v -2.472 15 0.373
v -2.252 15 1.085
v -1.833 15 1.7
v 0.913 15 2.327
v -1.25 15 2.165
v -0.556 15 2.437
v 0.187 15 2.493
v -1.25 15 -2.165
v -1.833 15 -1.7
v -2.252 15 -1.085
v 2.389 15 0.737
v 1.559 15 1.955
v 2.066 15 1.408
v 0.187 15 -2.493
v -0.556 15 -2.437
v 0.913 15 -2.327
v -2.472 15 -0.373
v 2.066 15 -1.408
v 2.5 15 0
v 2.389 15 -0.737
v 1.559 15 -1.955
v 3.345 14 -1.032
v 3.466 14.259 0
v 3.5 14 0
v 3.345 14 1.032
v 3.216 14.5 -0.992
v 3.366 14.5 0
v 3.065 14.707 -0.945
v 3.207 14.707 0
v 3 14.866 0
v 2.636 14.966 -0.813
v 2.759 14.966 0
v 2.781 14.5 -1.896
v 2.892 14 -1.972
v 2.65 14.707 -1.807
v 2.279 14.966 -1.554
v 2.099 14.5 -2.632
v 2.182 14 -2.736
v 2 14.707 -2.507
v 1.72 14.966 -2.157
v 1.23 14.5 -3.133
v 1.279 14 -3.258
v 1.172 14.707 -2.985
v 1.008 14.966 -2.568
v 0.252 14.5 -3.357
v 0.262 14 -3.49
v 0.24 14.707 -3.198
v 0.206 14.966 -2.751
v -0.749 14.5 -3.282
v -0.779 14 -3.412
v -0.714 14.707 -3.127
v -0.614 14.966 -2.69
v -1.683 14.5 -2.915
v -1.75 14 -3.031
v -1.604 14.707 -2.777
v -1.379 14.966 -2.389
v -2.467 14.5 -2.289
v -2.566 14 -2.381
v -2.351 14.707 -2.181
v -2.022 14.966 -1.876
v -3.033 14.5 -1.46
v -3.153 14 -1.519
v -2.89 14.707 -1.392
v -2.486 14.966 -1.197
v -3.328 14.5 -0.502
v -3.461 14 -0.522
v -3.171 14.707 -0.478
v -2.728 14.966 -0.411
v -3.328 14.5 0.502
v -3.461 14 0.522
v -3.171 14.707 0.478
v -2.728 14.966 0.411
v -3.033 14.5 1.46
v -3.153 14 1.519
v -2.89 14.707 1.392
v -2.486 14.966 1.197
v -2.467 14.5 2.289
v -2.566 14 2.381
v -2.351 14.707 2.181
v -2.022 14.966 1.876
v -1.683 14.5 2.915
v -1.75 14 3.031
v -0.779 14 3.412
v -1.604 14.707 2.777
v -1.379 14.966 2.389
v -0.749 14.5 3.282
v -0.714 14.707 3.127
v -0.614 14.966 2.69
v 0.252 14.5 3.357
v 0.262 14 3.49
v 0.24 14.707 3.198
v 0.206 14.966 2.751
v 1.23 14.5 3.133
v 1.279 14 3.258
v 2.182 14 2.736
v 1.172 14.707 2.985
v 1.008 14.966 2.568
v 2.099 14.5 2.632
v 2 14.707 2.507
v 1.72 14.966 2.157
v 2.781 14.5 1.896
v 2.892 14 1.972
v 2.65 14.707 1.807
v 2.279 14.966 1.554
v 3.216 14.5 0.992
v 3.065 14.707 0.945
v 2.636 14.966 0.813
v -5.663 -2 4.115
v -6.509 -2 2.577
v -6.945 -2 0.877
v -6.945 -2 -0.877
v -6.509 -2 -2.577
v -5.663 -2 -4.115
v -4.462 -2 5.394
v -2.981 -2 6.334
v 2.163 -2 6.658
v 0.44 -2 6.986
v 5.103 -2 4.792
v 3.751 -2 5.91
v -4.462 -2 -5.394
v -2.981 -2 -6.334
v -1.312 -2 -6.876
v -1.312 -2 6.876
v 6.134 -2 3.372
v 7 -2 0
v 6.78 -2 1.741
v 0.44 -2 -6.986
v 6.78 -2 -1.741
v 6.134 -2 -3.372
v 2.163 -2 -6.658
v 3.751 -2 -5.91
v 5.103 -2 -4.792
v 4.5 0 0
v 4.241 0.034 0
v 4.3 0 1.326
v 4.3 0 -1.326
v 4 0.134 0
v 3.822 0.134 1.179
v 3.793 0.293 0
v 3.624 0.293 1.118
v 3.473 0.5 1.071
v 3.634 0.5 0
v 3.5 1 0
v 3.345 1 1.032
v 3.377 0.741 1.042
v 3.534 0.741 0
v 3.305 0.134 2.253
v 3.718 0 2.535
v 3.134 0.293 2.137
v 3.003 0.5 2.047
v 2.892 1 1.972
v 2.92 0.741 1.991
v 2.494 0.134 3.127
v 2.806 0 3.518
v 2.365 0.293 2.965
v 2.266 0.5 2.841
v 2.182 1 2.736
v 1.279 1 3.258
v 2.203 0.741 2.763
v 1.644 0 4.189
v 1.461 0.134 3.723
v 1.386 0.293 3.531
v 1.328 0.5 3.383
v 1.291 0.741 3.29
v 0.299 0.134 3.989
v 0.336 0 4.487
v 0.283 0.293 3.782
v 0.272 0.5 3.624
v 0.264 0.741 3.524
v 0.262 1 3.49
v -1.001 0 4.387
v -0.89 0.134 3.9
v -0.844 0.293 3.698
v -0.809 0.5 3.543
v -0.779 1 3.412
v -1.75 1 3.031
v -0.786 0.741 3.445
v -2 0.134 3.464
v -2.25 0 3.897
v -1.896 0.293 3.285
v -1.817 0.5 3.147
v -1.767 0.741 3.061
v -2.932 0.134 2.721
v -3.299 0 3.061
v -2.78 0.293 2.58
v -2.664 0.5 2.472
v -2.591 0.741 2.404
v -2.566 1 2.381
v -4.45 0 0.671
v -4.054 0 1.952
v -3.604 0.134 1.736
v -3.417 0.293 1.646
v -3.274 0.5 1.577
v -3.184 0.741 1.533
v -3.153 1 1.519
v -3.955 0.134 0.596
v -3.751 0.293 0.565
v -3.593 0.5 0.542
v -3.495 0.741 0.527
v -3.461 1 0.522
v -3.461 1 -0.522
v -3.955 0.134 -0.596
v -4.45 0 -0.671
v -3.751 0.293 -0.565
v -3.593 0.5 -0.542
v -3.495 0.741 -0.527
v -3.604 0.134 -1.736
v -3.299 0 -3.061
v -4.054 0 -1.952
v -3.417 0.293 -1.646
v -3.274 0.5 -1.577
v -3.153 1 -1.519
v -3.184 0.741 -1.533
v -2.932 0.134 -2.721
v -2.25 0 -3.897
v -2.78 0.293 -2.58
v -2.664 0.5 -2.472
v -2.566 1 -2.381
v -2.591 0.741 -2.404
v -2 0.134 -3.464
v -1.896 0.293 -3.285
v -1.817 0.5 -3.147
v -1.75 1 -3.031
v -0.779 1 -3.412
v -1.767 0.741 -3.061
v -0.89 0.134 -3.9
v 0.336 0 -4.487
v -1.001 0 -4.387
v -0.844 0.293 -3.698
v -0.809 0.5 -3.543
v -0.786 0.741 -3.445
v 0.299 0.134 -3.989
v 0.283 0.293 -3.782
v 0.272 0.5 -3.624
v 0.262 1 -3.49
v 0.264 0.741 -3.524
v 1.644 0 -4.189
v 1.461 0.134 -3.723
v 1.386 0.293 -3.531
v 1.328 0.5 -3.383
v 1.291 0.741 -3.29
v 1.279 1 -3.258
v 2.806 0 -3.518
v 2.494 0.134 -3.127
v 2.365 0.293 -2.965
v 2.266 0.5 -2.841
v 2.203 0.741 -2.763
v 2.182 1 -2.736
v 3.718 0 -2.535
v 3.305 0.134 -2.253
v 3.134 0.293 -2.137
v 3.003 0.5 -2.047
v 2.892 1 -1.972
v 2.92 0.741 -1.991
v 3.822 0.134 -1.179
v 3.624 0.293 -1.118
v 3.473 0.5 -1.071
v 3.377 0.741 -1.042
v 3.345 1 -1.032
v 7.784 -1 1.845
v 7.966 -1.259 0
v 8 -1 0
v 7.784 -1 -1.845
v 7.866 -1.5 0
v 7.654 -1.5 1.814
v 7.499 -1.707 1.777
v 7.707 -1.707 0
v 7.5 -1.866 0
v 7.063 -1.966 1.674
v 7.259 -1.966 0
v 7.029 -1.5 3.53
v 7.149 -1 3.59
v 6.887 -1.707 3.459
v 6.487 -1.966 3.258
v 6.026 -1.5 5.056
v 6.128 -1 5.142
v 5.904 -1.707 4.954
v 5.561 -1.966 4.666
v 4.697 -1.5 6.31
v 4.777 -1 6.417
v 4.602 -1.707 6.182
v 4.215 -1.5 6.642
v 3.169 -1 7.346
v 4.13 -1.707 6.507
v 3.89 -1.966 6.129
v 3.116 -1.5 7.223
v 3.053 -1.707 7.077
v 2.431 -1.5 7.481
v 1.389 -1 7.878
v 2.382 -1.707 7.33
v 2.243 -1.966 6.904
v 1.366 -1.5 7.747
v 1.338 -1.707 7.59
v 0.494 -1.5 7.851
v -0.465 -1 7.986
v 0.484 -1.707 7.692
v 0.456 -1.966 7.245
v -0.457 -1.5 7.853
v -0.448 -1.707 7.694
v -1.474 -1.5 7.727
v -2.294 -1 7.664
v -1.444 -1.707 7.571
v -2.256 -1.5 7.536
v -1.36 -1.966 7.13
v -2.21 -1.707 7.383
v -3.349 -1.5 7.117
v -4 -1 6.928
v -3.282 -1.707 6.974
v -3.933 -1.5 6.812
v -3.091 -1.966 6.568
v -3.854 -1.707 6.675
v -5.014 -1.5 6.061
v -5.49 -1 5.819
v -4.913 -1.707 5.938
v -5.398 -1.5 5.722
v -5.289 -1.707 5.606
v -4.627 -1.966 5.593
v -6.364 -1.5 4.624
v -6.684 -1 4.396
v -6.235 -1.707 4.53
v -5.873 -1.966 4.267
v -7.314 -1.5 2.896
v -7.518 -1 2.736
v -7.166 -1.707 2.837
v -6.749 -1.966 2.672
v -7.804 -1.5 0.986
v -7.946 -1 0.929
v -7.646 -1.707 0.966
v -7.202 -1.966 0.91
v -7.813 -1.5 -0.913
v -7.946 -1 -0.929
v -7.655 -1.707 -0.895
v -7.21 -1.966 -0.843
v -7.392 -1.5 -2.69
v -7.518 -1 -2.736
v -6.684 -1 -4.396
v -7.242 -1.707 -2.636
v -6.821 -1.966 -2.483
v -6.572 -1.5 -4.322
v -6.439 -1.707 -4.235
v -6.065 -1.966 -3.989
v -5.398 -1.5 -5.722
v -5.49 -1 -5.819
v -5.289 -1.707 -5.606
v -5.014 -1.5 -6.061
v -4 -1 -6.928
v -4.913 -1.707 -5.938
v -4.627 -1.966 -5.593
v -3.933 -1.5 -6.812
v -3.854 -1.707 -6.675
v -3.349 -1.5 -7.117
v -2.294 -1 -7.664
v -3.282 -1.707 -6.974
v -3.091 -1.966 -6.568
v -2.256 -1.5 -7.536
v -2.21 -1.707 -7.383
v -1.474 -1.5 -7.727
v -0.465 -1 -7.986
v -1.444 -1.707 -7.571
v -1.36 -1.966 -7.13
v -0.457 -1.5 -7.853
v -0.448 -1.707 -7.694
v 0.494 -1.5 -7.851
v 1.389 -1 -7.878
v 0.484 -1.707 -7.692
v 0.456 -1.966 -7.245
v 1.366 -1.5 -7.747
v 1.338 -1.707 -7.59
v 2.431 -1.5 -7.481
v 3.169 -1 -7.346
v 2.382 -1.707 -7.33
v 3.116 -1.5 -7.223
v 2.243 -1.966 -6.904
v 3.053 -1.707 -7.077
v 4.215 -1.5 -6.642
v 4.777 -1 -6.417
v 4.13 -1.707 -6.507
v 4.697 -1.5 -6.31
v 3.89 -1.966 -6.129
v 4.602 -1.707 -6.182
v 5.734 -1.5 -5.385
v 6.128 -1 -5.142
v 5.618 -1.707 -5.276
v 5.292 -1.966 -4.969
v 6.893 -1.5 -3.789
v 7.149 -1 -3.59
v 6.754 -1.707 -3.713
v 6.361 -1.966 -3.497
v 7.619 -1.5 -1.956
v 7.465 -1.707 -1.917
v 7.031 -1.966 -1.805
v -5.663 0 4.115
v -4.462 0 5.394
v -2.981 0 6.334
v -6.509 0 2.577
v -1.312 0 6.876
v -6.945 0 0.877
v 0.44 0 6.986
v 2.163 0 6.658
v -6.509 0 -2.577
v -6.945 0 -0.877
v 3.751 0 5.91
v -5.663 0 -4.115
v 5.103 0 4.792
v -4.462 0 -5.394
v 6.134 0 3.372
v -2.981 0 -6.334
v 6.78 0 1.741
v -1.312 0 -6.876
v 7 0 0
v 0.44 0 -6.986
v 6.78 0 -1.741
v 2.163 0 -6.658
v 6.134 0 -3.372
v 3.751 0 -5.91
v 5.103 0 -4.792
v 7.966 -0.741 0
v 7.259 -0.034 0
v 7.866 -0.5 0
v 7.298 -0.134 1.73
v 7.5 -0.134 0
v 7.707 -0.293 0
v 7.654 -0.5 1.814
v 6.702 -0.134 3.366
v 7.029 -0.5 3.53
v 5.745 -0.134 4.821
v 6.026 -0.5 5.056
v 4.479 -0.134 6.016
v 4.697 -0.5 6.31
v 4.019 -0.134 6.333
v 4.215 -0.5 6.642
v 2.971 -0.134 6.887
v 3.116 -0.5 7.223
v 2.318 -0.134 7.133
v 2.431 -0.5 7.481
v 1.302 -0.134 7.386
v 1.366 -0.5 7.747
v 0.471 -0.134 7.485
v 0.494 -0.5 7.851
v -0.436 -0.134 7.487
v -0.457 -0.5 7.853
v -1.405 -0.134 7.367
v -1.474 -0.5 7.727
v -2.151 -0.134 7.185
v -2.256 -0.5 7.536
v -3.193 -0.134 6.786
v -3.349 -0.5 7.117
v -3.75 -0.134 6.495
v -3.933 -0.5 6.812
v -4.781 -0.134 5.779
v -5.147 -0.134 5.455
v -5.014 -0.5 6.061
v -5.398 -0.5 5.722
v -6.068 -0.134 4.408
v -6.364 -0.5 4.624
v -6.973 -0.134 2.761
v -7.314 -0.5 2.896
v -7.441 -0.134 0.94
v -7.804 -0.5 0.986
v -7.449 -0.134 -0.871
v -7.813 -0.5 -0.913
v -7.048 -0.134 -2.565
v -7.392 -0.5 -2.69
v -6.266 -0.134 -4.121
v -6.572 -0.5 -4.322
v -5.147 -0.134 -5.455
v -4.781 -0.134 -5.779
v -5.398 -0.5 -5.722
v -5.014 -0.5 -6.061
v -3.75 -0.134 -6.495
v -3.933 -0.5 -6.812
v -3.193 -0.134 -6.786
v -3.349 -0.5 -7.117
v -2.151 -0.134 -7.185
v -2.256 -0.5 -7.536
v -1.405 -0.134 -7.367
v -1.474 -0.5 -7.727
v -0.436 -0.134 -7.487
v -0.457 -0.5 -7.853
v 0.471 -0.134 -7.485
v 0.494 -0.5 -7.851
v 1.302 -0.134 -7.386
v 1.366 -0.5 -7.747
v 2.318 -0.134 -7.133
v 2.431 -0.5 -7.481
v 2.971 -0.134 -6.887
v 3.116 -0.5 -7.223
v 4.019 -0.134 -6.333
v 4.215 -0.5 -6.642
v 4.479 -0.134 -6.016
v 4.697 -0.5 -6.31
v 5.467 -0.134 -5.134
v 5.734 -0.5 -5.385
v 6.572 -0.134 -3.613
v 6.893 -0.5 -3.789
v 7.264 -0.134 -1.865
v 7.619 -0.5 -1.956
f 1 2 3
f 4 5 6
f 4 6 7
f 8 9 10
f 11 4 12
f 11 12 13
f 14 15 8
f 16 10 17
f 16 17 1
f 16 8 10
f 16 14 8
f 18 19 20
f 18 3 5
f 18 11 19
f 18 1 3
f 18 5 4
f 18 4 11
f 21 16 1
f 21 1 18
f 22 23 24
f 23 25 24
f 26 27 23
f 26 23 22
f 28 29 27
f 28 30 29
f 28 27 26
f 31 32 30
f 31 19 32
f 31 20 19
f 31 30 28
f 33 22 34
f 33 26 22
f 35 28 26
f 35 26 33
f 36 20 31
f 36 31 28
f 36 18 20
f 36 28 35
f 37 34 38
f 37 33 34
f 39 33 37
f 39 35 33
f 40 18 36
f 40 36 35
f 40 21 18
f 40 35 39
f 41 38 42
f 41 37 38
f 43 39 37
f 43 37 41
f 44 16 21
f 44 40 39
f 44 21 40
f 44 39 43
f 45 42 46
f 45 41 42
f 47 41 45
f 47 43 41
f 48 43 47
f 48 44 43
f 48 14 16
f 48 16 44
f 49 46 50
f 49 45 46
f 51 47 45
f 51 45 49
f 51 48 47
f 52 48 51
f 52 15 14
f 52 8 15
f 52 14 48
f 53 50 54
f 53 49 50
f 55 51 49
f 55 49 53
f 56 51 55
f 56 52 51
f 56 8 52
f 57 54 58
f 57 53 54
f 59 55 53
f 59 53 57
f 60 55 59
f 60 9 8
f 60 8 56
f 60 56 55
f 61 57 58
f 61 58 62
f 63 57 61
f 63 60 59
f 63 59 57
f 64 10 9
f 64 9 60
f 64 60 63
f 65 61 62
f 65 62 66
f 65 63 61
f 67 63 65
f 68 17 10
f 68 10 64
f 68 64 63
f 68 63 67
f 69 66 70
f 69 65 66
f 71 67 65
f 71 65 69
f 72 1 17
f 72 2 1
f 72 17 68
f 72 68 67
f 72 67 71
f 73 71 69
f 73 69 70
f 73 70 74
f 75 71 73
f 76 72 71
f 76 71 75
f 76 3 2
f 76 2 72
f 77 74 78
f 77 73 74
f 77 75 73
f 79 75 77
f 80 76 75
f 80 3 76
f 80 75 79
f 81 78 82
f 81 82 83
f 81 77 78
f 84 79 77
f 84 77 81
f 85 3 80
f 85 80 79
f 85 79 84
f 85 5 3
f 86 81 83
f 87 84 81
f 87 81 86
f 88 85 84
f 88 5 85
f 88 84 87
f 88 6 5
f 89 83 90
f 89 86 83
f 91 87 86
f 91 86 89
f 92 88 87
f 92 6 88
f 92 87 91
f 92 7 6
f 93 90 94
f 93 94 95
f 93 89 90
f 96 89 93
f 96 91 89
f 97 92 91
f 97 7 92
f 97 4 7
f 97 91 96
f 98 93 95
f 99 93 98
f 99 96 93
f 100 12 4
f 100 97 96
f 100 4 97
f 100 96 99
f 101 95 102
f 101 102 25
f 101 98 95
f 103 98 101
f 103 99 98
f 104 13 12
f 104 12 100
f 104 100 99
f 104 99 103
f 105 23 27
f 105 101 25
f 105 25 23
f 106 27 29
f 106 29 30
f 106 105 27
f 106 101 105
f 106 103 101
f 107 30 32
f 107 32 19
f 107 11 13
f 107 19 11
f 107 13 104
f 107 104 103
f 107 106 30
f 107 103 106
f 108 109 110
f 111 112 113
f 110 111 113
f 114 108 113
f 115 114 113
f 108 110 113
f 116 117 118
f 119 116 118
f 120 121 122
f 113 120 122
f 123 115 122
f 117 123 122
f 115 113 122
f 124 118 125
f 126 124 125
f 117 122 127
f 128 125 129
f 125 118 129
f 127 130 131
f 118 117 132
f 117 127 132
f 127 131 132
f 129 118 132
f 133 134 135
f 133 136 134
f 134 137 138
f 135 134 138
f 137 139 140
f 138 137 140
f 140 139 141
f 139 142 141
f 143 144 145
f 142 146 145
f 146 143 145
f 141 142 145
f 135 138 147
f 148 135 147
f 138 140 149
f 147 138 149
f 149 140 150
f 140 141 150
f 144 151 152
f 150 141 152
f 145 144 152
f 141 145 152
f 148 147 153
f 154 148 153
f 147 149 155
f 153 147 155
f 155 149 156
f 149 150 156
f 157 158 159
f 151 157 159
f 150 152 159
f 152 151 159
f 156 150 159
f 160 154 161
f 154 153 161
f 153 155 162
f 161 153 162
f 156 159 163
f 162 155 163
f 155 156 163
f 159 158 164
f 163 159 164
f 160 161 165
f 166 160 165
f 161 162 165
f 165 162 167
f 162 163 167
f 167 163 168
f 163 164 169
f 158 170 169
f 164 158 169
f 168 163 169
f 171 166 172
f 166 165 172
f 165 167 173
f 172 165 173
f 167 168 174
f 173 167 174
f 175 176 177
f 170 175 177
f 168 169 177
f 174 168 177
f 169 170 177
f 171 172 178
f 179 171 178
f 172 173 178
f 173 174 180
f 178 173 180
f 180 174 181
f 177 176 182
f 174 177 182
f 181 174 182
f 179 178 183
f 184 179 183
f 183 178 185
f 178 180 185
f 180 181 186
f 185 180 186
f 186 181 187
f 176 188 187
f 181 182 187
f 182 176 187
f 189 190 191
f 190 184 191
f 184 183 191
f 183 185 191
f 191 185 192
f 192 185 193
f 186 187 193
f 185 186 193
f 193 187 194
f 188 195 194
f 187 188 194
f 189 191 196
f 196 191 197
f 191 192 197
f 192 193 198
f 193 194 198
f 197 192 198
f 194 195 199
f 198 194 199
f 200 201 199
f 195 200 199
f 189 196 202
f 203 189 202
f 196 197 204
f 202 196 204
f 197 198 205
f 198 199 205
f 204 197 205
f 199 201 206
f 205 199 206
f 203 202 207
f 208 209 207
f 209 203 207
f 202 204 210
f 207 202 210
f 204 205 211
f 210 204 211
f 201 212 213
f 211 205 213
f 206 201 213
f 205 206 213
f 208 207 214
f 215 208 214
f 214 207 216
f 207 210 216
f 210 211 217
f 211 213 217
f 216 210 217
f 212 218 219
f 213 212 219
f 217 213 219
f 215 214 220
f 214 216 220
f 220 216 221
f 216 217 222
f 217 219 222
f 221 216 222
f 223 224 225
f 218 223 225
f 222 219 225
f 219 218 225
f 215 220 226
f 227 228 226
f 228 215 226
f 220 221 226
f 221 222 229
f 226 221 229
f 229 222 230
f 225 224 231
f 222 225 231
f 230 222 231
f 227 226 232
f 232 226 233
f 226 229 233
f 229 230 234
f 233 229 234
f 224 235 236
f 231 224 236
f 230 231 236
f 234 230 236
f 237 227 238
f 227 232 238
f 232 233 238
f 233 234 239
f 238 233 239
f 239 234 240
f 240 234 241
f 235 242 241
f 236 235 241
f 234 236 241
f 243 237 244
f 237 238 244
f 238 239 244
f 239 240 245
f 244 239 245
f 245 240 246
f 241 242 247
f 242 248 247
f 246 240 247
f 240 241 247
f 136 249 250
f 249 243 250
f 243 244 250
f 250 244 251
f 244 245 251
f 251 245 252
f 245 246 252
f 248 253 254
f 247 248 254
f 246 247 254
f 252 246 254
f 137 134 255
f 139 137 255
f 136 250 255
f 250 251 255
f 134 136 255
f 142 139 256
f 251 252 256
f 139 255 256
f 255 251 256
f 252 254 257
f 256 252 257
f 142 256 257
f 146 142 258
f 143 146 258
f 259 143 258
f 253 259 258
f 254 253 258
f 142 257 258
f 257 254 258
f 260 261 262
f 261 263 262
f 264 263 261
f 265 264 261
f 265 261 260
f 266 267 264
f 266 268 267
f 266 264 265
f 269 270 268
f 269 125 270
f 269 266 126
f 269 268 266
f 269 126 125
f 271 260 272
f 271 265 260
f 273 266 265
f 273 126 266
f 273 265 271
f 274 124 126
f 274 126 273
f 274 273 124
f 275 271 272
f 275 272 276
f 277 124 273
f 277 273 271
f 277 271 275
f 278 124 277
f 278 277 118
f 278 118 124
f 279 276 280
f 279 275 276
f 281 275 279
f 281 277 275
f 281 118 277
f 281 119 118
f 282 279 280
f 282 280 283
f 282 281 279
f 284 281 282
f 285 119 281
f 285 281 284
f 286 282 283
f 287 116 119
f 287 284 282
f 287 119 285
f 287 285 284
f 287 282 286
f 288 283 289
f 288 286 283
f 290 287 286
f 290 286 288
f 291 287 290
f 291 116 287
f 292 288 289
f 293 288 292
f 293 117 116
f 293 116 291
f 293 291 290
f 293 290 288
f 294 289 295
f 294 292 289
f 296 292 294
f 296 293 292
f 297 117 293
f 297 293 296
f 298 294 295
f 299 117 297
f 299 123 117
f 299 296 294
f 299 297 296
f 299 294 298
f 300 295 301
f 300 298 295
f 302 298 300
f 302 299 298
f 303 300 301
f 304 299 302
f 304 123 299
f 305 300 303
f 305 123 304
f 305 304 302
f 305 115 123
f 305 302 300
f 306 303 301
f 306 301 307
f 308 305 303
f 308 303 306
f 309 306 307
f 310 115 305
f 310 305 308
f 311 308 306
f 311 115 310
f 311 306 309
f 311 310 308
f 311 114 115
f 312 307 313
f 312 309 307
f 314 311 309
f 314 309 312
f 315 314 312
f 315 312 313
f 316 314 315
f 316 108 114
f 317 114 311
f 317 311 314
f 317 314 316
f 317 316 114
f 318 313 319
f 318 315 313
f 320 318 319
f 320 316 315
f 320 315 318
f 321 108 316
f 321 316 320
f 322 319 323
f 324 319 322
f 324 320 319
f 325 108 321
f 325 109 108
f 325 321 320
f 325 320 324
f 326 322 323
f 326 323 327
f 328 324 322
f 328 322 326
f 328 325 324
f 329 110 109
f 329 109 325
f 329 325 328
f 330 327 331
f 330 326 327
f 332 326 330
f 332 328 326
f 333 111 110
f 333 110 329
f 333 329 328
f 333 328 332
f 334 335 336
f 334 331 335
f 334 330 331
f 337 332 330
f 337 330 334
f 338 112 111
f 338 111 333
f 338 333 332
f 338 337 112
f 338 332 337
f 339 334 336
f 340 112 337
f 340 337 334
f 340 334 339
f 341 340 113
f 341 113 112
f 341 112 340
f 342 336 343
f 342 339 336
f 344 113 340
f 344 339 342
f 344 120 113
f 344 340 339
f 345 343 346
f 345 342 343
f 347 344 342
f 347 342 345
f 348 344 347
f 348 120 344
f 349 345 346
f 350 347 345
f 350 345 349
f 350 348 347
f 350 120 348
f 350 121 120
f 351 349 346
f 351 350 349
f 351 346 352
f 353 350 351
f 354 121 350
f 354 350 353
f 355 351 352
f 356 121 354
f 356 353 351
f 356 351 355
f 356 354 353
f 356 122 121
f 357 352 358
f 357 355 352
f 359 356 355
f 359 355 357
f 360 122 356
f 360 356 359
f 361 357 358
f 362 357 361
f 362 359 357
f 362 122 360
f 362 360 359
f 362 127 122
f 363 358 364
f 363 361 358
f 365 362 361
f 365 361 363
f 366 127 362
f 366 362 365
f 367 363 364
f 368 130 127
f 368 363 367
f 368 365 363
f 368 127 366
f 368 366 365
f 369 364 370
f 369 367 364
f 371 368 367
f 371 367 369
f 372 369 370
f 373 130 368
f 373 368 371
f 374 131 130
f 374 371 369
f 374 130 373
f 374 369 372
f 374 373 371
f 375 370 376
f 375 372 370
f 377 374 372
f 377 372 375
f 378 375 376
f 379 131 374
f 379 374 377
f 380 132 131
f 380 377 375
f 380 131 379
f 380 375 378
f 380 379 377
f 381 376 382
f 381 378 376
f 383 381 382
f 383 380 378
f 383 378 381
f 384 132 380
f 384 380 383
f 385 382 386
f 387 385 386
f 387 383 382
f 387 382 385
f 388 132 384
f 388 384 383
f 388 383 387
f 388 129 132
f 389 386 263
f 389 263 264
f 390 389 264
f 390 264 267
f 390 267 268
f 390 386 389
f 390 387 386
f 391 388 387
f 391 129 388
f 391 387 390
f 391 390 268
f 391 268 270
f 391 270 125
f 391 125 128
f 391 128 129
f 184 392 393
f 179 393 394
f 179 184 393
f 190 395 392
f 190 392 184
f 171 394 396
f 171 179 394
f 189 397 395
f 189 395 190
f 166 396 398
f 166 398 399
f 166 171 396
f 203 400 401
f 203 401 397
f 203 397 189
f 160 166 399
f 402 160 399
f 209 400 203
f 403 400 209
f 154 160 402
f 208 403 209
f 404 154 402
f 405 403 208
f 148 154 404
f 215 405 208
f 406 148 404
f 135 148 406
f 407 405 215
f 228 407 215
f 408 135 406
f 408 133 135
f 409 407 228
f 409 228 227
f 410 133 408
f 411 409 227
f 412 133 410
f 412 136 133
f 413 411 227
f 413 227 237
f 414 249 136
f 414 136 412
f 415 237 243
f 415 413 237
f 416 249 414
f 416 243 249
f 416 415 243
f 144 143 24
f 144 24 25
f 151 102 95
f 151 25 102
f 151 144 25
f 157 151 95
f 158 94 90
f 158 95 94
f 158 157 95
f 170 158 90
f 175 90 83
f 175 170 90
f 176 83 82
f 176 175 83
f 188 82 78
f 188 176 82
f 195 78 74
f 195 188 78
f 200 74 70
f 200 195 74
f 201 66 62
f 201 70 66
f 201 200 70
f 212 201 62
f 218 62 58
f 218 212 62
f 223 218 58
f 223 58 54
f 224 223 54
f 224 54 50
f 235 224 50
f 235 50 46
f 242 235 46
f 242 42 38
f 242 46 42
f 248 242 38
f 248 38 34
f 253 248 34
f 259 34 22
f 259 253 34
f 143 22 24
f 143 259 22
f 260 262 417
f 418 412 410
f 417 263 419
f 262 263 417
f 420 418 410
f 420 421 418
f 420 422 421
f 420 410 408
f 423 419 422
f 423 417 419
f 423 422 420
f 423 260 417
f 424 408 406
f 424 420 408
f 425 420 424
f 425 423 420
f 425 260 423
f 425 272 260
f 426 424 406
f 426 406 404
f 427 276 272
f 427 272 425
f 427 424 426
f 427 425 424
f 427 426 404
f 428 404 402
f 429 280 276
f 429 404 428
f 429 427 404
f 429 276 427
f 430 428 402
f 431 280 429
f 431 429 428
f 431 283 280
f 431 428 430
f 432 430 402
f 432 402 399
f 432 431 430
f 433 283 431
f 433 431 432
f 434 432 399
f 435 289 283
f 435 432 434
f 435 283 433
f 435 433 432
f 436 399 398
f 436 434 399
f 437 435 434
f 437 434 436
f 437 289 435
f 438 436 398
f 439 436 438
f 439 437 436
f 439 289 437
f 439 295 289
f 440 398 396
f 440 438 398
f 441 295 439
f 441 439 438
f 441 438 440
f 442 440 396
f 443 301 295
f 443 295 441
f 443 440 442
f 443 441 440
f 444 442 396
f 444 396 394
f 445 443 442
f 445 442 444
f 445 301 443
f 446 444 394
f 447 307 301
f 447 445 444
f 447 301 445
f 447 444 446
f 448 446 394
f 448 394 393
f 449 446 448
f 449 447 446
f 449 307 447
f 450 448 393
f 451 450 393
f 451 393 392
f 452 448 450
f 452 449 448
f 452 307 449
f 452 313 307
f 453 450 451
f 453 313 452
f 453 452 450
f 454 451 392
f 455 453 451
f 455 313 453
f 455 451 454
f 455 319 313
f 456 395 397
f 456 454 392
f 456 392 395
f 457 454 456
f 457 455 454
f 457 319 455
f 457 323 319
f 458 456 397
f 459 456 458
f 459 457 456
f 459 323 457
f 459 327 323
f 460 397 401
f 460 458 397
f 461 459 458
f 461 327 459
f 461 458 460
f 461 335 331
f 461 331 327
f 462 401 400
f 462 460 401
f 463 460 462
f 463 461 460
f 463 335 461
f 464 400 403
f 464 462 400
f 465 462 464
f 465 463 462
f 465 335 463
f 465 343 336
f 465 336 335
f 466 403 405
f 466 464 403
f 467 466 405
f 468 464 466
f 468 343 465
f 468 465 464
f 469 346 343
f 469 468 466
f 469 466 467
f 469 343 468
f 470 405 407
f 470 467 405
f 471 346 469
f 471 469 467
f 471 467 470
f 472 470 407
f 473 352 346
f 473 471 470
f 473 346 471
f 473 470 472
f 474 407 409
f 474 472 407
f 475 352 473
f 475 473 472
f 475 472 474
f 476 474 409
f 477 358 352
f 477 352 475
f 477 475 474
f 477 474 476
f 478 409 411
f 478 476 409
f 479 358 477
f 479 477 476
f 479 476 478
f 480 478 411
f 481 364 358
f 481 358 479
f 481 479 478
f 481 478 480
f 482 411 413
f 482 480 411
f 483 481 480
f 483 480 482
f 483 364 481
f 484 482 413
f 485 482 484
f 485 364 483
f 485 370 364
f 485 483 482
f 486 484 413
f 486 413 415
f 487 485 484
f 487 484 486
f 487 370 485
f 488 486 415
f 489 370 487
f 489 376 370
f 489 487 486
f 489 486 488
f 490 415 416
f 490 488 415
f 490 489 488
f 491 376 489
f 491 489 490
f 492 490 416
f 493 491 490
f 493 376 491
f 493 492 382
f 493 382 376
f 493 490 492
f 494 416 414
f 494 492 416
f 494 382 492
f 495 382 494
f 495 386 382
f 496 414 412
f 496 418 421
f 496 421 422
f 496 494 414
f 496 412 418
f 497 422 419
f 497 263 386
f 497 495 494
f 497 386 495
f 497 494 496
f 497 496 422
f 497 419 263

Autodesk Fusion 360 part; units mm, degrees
sketch "スケッチ1" plane through (0, 0, 0) normal (0, 1, 0) x (1, 0, 0)
  circle A0 centre (0, 0) radius 3.5
  circle A1 centre (0, 0) radius 8
  dimension "d1" = 7
  dimension "d14" = 16
extrude "押し出し1" add sketch "スケッチ1" along normal blind 15 contours A0 makes body 1
extrude "押し出し2" add sketch "スケッチ1" against normal blind 2 contours A0 | A1 bodies 1
sphere "球プリミティブ1" add diameter 34 placed x (1, 0, 0) y (0, 0, -1) z (0, 1, 0) at (0, 0, 0) separate body makes body 2
move_body "移動1" bodies 2 to x (1, 0, 0) y (0, 1, 0) z (0, 0, 1) at (0, 38.5, 0)
fillet "フィレット4" radius 1 1 edges at (-3.2631, 0, 1.2657) on bodies 1
fillet "フィレット5" radius 1 1 edges at (-3.2631, 15, 1.2657) on bodies 1
fillet "フィレット6" radius 1 2 edges at (-7.4586, 0, 2.8929) (-7.4586, -2, -2.8929) on bodies 1
delete_body "RemoveBody1" bodies 2
